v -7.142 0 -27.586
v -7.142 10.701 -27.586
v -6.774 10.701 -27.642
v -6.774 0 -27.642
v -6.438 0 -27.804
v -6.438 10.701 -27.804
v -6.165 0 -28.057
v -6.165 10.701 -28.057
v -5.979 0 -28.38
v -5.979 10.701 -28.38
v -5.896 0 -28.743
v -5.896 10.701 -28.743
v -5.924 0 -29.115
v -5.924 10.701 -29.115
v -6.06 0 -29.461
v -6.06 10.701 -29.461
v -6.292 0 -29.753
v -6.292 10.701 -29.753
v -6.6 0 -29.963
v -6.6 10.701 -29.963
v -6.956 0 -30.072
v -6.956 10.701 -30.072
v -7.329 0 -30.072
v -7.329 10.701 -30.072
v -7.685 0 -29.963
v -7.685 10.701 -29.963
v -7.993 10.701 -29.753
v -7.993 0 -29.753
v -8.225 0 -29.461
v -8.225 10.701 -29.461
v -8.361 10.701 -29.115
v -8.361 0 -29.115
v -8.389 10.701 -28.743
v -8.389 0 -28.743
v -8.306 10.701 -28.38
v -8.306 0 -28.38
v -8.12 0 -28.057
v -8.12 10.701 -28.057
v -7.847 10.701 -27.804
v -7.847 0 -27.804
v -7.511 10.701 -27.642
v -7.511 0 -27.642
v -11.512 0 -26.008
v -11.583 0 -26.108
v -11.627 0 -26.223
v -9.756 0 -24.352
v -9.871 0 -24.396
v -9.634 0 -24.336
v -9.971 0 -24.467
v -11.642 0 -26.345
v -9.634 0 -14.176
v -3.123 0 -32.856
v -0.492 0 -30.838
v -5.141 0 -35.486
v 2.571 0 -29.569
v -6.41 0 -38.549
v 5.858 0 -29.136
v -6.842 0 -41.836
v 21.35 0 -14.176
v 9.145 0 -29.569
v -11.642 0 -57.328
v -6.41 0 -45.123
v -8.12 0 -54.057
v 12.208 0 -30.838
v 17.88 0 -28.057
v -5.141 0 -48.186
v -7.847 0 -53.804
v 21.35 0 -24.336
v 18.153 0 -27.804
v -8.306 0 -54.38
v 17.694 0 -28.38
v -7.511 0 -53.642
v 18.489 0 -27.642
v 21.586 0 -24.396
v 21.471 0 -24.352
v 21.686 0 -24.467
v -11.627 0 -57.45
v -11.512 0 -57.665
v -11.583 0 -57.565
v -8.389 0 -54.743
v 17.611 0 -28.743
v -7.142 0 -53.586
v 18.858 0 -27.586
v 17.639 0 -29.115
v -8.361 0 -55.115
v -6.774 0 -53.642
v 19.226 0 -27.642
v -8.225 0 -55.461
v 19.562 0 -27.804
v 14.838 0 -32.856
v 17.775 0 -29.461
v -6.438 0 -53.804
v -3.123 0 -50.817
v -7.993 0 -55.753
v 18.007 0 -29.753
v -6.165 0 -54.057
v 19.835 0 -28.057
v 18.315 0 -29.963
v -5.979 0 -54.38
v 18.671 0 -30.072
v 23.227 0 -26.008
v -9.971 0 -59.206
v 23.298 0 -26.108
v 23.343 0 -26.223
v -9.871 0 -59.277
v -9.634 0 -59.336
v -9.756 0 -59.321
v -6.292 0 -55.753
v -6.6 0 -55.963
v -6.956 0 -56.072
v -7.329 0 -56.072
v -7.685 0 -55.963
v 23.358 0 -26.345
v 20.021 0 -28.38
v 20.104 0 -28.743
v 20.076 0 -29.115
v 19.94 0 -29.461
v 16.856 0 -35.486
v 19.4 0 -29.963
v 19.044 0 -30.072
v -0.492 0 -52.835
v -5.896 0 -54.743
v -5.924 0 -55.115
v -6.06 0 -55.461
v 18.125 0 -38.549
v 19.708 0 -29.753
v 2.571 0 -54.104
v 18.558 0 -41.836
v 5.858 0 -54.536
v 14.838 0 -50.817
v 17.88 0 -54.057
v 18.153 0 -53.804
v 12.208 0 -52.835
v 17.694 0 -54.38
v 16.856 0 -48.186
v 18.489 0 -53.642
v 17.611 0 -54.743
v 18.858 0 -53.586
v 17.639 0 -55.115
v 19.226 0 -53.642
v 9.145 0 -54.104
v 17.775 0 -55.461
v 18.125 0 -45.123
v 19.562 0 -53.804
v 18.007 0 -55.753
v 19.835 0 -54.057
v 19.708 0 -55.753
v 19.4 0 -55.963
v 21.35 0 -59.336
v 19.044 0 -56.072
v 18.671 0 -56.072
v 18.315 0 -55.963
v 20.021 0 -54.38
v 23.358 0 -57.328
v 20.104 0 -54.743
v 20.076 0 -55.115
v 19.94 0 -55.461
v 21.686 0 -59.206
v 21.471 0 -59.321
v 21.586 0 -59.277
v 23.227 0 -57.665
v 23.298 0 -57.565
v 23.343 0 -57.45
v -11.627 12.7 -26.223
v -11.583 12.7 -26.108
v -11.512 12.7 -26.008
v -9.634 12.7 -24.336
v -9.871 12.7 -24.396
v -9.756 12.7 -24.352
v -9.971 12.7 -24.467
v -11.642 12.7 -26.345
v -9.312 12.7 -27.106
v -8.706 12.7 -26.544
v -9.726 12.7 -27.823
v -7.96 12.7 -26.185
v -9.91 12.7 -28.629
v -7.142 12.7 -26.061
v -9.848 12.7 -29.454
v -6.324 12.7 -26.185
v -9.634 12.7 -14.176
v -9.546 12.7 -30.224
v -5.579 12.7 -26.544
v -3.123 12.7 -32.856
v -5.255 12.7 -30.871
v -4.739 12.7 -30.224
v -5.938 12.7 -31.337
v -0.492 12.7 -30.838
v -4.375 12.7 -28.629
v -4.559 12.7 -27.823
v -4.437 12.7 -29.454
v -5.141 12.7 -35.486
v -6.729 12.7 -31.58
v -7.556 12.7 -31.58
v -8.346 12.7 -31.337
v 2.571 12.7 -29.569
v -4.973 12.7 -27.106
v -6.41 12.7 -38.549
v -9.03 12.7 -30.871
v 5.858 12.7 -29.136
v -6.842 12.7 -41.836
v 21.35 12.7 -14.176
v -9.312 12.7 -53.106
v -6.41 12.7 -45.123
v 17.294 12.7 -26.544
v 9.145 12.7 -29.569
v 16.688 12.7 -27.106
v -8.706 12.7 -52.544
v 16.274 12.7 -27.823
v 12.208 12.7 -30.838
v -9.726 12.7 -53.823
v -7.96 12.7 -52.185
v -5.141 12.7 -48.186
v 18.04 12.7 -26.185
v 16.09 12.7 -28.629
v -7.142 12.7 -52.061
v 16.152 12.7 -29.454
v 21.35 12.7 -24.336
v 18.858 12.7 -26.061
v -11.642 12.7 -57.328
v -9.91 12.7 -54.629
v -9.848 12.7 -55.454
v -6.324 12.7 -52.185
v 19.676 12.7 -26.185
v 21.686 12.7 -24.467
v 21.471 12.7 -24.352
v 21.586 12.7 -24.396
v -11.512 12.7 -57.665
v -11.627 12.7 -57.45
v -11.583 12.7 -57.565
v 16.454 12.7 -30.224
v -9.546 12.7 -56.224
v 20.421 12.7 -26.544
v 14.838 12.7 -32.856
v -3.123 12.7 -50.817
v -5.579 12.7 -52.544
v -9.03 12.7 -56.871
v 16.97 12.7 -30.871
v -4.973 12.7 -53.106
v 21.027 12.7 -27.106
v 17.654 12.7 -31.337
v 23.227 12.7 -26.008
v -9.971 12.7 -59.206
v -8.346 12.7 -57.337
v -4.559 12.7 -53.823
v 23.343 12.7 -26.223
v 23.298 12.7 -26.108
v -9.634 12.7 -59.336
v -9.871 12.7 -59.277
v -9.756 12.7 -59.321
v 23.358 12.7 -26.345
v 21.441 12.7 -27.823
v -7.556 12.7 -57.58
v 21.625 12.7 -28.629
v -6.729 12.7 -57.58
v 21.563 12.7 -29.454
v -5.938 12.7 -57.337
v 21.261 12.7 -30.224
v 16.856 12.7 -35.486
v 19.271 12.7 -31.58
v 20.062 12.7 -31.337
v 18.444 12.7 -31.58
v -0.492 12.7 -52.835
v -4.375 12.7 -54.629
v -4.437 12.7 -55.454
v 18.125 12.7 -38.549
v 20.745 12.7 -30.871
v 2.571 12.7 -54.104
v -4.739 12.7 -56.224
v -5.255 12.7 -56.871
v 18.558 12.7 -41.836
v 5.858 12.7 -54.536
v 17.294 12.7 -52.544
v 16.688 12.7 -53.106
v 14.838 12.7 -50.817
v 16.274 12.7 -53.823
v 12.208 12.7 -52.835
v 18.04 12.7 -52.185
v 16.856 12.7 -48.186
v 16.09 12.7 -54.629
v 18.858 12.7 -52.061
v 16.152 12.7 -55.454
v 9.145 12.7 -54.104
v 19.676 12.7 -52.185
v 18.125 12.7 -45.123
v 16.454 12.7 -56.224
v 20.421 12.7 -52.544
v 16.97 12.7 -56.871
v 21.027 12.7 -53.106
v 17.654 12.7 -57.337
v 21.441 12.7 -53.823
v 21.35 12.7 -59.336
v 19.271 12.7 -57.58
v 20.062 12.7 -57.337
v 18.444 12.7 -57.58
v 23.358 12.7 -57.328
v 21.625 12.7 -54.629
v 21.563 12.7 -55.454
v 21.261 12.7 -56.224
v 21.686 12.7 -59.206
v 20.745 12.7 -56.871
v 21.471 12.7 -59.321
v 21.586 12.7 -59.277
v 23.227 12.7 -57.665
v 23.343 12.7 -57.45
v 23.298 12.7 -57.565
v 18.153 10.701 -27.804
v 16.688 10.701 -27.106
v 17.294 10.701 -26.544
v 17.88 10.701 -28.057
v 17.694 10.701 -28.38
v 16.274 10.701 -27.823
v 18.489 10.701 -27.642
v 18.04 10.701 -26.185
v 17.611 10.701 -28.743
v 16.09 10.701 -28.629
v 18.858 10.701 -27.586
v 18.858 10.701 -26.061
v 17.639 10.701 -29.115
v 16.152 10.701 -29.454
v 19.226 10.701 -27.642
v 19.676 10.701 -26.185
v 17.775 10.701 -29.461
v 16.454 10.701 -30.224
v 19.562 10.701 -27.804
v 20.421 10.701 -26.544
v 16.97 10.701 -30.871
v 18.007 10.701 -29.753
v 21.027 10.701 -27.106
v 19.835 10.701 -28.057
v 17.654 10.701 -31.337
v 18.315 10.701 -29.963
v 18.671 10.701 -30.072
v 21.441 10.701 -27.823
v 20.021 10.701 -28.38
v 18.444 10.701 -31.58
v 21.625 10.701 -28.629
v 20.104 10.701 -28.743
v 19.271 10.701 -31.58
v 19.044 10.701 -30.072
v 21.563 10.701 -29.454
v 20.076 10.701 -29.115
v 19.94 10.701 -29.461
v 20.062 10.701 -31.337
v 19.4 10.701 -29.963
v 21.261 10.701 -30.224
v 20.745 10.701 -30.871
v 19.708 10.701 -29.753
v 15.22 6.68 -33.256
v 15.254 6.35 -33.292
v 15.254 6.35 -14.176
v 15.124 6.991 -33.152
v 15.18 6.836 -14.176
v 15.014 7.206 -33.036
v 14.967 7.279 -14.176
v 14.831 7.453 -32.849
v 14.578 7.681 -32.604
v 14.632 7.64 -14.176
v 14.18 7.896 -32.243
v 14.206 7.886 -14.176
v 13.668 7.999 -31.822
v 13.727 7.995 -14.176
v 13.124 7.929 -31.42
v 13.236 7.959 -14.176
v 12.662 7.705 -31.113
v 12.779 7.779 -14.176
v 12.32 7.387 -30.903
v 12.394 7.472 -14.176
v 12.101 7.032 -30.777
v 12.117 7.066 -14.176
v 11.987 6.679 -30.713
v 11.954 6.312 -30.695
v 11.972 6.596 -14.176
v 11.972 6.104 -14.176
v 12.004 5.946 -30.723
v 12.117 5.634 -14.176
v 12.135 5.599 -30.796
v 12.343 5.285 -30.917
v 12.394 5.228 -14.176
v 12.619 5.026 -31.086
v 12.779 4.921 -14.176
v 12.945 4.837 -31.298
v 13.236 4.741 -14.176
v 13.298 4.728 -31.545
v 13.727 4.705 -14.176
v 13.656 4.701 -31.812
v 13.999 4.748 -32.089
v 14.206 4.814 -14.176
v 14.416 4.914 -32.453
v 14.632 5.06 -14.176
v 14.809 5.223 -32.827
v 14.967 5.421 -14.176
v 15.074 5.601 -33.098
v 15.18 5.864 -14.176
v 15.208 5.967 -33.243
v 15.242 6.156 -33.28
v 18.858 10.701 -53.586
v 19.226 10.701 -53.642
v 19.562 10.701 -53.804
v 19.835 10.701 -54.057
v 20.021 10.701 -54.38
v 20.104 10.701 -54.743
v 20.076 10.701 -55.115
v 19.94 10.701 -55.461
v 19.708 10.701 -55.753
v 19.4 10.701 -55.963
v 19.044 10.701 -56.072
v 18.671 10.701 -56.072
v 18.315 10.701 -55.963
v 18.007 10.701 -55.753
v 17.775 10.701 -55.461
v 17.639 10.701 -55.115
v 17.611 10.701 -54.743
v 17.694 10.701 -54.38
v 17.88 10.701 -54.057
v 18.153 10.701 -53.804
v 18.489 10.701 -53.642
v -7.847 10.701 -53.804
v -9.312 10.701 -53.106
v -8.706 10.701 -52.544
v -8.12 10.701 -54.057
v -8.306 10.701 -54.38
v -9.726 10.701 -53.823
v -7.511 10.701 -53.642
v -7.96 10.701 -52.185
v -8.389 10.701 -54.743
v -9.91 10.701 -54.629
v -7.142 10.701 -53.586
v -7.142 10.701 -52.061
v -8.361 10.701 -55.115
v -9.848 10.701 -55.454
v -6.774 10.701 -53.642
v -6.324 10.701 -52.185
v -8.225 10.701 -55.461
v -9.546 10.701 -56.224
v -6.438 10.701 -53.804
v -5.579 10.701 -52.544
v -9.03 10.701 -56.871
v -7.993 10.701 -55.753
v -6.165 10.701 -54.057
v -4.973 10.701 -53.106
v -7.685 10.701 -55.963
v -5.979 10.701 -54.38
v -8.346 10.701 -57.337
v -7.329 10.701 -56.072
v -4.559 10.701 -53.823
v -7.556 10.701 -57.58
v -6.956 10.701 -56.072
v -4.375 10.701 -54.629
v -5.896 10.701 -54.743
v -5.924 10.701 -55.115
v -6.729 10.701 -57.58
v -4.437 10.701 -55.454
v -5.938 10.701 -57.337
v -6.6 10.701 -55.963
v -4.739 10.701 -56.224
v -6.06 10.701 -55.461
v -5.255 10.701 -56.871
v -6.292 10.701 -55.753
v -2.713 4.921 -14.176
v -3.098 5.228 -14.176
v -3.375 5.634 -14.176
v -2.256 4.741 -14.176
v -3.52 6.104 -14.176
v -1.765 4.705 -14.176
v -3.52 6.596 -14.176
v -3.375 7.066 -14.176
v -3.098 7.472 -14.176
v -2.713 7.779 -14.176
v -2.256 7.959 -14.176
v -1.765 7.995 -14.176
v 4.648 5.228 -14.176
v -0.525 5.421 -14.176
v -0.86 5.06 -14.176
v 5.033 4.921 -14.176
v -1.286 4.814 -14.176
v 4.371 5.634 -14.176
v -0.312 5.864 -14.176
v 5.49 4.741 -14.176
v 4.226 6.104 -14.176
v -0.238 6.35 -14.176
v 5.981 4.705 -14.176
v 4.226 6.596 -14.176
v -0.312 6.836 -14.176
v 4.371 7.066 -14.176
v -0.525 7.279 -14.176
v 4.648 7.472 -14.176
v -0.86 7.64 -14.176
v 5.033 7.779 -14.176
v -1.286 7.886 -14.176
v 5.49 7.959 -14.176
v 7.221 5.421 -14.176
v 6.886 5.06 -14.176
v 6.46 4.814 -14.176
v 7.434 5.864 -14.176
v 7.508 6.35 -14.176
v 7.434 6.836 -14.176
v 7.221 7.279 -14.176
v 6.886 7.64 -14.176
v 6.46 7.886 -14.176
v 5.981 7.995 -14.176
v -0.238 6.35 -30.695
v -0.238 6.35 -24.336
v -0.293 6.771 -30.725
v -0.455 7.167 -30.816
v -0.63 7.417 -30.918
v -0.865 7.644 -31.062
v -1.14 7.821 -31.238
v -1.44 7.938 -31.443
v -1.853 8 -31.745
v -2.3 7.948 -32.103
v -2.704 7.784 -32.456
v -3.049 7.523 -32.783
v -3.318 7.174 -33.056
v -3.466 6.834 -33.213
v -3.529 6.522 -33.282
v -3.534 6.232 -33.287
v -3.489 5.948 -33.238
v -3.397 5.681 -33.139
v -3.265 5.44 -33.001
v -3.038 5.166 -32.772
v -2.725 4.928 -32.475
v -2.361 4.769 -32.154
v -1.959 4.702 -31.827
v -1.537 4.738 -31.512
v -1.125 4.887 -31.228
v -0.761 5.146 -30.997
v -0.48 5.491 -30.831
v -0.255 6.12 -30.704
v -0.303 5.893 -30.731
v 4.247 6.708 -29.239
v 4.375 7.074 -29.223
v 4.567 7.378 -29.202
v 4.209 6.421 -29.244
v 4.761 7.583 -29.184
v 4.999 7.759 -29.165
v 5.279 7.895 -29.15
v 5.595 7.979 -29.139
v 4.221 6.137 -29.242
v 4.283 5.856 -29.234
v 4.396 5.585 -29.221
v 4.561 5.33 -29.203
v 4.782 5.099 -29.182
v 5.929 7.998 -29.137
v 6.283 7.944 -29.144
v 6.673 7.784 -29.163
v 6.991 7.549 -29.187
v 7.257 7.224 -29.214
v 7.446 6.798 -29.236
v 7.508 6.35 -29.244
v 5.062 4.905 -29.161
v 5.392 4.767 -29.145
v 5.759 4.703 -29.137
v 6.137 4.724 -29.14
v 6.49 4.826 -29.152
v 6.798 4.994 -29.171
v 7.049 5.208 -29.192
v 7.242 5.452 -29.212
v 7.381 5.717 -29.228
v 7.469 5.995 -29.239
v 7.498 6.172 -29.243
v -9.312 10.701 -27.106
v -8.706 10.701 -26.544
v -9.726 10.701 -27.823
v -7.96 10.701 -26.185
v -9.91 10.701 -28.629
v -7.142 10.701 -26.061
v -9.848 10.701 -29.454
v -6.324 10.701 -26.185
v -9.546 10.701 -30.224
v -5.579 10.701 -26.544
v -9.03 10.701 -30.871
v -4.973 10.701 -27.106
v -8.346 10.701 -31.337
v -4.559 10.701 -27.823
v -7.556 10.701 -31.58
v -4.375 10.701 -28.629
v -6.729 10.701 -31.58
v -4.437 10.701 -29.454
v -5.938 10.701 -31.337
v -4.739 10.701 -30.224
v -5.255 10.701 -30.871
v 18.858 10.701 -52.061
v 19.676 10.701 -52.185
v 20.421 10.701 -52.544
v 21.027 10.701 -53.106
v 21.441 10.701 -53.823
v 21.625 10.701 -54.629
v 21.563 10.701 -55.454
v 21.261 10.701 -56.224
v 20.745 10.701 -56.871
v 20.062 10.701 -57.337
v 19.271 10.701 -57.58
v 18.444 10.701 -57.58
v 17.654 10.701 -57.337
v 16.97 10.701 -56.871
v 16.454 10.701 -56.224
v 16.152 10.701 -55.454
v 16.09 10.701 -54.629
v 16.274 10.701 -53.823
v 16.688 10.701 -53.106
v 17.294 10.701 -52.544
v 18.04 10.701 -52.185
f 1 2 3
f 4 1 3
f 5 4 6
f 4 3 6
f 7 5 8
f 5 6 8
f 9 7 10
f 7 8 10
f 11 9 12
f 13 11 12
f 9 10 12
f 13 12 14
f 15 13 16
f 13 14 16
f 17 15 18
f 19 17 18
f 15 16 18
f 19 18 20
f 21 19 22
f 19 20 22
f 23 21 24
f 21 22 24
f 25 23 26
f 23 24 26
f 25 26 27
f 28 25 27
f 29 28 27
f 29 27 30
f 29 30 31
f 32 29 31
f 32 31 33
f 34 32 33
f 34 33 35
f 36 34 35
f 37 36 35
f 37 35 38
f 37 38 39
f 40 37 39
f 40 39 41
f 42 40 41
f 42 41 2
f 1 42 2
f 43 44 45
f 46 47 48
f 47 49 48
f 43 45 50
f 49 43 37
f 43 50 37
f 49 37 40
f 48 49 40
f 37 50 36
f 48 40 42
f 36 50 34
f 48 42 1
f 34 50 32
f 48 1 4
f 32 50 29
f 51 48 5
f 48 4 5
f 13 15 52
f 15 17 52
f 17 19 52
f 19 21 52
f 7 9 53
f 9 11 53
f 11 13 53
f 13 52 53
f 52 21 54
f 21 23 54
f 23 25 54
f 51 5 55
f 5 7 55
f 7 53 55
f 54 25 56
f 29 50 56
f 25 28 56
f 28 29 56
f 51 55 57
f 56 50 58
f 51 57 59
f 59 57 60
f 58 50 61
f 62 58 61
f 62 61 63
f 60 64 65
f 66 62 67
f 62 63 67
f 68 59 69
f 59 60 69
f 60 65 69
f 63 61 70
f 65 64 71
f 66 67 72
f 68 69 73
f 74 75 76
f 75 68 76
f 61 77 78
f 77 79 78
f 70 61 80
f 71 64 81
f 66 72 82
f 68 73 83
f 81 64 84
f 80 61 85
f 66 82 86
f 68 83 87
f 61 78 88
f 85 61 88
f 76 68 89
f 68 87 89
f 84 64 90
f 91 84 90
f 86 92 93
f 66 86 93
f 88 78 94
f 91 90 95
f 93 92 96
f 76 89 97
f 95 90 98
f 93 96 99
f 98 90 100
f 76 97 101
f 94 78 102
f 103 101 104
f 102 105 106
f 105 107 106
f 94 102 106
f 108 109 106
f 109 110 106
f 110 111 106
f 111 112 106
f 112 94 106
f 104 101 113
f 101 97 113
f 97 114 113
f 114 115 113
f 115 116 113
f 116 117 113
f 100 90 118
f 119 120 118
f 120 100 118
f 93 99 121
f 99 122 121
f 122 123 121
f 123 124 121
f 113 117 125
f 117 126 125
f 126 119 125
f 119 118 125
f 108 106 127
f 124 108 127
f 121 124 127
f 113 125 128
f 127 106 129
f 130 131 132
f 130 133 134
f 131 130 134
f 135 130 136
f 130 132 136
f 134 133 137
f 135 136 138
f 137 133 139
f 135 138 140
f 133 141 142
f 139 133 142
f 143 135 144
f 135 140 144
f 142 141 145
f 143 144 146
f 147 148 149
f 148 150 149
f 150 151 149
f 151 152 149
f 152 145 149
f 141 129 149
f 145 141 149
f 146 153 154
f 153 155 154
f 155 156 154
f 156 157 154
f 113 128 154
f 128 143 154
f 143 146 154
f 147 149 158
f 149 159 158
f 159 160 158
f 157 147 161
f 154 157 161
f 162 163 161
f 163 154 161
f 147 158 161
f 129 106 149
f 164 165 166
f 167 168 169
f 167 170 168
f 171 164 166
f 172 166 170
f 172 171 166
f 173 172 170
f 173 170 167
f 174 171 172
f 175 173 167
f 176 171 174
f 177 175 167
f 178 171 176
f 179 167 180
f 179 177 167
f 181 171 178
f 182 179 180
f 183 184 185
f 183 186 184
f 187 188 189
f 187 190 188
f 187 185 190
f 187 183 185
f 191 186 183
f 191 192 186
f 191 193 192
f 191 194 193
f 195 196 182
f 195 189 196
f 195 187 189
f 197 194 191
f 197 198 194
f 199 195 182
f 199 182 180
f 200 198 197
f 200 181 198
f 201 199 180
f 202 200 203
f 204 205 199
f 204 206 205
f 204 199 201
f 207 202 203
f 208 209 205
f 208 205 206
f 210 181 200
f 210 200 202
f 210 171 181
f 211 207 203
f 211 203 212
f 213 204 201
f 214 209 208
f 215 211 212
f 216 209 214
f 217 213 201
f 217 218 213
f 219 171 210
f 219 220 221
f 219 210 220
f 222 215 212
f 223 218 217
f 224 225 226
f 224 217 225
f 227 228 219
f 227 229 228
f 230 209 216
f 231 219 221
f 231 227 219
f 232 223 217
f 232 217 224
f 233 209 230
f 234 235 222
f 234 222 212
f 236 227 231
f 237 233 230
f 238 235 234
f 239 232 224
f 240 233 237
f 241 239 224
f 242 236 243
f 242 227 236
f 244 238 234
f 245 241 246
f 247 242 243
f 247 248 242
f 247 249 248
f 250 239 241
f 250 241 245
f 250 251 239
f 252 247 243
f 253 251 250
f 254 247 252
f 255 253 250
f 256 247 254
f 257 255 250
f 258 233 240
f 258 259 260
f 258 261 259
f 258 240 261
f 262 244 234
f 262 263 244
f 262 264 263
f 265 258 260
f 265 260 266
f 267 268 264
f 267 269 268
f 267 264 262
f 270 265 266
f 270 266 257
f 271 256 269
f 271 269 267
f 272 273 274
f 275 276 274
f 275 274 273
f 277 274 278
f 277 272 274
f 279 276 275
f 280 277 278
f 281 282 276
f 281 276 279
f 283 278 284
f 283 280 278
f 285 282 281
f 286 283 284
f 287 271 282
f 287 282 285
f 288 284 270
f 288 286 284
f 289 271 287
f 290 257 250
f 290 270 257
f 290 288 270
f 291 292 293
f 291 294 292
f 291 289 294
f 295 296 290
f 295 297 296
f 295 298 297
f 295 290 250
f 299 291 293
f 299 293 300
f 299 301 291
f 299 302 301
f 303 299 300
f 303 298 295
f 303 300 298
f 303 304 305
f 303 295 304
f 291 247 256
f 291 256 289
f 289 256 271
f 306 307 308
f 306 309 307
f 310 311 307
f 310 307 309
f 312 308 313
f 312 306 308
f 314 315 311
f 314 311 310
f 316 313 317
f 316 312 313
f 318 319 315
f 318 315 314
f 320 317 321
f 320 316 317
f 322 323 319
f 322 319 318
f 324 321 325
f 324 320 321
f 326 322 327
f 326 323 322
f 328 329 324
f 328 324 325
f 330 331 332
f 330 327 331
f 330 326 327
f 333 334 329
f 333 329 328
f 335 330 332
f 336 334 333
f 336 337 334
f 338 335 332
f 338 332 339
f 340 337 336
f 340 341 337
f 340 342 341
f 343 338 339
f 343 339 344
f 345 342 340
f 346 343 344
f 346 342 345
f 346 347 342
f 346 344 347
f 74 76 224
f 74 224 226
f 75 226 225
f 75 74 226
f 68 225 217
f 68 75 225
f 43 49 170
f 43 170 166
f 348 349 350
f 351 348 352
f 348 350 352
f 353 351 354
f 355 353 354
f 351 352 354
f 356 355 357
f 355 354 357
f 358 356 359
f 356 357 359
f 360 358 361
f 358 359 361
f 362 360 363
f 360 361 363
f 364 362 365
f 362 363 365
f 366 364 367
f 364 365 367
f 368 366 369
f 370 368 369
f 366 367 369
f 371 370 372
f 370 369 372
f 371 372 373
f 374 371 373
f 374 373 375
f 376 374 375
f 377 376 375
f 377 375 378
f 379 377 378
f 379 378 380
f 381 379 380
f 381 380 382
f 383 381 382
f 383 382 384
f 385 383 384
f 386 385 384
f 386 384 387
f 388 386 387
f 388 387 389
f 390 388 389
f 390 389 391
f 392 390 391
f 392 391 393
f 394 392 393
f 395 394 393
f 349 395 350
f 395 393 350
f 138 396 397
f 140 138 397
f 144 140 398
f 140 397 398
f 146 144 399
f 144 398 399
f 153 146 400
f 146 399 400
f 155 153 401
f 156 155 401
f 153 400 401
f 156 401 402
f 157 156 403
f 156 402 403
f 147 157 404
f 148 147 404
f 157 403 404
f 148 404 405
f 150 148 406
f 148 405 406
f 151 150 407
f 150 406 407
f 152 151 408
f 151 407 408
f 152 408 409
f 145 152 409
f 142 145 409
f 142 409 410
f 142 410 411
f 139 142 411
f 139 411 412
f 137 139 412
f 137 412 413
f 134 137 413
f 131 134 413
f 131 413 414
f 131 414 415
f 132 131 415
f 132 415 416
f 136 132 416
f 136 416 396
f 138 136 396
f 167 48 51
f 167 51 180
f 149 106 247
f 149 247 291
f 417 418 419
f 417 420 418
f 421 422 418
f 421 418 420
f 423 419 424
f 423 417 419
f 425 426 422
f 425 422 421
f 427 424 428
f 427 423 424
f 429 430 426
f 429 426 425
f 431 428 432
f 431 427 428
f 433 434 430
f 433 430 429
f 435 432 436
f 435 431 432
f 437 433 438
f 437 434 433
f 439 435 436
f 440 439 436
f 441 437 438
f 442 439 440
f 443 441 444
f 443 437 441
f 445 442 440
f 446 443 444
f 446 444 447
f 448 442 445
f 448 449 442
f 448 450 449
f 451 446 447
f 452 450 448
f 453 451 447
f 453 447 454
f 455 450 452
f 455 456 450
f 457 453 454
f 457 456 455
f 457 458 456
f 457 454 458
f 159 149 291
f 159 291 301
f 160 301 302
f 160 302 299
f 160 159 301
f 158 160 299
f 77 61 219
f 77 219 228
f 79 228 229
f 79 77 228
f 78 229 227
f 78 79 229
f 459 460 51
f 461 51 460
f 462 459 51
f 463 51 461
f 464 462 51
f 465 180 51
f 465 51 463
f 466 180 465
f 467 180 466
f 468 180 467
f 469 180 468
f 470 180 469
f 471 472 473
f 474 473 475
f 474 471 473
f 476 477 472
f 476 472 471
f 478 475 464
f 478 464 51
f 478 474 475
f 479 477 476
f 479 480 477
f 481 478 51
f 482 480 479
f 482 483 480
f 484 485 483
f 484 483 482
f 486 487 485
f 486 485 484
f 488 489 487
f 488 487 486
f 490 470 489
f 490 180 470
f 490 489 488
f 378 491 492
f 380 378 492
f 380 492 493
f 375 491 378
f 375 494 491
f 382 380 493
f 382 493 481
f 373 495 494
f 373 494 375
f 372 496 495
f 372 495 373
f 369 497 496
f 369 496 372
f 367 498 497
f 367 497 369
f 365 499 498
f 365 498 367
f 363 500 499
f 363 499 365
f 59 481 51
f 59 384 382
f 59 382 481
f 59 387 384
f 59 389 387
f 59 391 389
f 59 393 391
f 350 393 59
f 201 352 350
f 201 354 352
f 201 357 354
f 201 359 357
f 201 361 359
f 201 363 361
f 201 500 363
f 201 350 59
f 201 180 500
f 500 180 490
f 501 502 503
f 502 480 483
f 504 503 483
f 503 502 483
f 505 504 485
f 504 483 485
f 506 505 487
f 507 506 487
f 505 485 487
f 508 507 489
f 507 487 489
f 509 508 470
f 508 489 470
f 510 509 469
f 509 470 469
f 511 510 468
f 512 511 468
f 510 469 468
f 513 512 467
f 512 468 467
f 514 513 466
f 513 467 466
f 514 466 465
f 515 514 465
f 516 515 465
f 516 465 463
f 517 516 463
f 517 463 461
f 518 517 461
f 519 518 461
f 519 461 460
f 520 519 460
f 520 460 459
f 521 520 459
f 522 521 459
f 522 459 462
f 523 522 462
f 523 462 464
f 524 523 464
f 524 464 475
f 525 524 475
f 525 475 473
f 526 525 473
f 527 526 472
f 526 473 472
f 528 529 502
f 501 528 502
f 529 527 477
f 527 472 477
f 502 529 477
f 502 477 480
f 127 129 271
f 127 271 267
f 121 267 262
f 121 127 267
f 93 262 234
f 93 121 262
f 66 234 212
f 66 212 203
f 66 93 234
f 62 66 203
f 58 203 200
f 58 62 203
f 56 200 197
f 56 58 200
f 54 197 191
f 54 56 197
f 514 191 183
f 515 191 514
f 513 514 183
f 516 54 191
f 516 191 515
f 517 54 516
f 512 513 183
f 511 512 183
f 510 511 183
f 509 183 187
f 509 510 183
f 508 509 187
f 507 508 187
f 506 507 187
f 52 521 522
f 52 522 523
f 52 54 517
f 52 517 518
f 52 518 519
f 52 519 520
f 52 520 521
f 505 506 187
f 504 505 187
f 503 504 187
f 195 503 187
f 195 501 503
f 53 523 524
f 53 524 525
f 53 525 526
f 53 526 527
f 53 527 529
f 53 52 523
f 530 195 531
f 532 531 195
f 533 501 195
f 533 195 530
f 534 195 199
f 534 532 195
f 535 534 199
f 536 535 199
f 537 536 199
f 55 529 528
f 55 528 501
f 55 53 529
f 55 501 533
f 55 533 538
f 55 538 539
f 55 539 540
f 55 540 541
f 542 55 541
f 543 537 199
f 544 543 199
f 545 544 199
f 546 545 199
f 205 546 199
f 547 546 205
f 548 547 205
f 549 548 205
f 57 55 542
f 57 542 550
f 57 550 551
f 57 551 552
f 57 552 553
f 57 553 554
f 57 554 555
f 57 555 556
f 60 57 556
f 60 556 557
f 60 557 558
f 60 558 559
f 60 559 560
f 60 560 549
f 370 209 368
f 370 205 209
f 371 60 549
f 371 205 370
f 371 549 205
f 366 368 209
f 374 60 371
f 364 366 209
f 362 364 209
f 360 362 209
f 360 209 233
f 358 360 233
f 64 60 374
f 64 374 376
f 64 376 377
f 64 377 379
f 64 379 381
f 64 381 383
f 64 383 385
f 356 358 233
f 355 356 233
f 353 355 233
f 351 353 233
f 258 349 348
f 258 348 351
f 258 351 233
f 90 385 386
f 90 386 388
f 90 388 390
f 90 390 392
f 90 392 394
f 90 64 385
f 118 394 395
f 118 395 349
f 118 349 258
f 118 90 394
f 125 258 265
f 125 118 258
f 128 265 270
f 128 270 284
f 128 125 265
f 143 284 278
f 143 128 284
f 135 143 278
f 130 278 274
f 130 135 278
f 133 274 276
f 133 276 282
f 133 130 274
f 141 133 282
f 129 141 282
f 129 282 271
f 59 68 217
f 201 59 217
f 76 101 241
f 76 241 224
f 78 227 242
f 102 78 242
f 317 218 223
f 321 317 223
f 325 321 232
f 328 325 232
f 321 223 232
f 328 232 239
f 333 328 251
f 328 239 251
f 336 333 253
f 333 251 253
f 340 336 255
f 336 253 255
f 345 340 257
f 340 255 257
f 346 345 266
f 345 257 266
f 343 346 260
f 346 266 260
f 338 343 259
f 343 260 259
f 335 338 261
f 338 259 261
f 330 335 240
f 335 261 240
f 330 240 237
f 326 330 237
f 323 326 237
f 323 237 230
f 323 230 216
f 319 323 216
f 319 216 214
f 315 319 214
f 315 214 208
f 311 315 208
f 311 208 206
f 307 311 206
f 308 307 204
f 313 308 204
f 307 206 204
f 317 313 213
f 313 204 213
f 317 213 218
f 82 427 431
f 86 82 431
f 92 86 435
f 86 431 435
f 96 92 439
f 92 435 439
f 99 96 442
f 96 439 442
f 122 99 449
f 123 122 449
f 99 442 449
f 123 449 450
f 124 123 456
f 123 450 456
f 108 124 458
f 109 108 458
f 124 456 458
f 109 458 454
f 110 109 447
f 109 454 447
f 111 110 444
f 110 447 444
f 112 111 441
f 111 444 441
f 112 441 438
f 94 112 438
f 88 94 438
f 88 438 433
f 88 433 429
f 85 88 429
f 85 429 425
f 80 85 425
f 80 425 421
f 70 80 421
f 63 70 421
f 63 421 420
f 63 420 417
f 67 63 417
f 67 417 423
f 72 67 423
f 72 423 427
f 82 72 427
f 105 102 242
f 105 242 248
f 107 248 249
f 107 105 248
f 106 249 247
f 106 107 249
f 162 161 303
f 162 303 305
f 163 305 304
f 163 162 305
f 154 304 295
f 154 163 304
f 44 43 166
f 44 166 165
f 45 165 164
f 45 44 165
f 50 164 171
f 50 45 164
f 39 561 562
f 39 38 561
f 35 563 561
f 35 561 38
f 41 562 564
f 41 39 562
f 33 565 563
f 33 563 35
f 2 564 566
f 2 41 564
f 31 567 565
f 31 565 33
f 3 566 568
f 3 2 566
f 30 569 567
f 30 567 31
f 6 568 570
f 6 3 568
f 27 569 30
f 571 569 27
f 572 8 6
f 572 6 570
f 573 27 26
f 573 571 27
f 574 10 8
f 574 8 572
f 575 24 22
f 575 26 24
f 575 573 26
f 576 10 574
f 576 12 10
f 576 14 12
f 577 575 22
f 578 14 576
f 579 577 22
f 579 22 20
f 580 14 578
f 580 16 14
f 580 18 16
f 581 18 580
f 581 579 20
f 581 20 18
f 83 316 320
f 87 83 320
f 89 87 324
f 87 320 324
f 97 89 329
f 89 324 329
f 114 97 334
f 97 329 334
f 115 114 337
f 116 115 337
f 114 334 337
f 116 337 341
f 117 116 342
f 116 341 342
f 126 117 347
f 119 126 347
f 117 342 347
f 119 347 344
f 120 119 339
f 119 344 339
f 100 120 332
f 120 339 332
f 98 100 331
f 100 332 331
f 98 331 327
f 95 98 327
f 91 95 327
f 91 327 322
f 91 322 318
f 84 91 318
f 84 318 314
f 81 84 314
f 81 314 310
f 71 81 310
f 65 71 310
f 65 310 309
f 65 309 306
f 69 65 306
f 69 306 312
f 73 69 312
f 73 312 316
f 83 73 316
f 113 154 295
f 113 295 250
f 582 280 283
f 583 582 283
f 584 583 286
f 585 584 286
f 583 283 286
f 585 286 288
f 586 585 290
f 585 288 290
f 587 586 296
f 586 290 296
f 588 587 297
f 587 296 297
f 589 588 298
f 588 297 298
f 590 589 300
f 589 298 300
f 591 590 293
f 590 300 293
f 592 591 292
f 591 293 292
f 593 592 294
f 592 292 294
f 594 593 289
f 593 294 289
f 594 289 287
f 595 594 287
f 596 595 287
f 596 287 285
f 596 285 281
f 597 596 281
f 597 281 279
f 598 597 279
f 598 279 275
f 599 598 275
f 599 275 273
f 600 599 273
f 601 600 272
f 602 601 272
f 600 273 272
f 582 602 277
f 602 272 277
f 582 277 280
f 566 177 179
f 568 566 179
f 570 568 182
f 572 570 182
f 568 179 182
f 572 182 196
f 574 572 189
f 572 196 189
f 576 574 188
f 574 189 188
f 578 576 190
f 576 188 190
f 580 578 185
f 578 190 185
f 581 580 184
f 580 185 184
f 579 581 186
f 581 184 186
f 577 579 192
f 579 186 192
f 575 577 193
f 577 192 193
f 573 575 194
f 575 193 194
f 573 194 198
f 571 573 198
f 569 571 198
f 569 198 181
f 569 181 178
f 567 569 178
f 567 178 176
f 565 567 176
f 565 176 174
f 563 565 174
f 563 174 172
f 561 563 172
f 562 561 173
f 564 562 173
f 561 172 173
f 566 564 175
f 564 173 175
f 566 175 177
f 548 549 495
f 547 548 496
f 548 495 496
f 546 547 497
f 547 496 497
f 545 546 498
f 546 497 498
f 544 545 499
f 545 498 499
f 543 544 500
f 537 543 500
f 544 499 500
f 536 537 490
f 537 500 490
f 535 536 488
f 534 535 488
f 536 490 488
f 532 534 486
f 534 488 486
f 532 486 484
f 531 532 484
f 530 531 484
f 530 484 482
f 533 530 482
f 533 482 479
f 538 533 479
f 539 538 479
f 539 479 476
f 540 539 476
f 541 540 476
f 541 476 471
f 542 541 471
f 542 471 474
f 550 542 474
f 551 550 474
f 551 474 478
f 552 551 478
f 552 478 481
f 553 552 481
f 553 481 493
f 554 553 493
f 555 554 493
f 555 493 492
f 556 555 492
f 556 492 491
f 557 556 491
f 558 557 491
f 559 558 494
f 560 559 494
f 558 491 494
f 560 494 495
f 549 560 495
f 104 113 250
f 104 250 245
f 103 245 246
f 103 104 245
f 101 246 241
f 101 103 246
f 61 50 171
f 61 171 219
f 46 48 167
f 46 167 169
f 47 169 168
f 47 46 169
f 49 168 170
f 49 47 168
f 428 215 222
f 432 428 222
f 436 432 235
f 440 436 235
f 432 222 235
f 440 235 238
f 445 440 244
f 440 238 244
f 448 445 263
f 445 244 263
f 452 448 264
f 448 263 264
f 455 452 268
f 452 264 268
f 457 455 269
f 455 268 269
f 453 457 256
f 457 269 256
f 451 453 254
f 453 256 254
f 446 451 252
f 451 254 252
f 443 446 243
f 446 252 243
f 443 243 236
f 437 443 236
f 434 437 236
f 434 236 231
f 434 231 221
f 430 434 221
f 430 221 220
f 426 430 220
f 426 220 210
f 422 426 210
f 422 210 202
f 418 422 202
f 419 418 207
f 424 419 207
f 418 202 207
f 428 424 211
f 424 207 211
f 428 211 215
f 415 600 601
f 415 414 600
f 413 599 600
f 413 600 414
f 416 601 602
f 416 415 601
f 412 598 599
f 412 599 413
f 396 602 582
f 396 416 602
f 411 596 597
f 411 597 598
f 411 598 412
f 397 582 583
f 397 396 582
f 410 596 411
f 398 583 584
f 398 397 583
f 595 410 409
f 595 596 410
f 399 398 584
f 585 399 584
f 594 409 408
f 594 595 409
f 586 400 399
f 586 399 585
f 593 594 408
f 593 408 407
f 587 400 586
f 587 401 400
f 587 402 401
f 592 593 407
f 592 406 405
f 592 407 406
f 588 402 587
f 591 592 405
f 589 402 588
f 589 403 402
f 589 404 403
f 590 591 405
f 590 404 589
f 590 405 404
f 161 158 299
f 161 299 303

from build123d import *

# Parameters (mm, degrees)
SKETCH1_R           = 12.7
SKETCH1_R_2         = 1.65
BOSS_EXTRUDE1_DEPTH = 12.7
SKETCH2_R           = 1.65
CUT_EXTRUDE1_DEPTH  = 12.7
SKETCH3_R           = 2.77495
CUT_EXTRUDE3_DEPTH  = 1.99898
SKETCH7_R           = 1.65
BOSS_EXTRUDE2_DEPTH = 10.70102
SKETCH8_R           = 1.65
BOSS_EXTRUDE3_DEPTH = 10.70102
SKETCH9_R           = 1.65
BOSS_EXTRUDE4_DEPTH = 10.70102
SKETCH10_R          = 1.65
BOSS_EXTRUDE5_DEPTH = 10.70102
SKETCH12_R          = 1.25
CUT_EXTRUDE4_DEPTH  = 12.7
SKETCH11_R          = 1.25
CUT_EXTRUDE5_DEPTH  = 12.7
SKETCH17_W          = 30.98386677
SKETCH17_H          = 12.7
BOSS_EXTRUDE6_DEPTH = 10.16
SKETCH18_R          = 1.650000002
SKETCH18_R_2        = 1.65
CUT_EXTRUDE6_DEPTH  = 24.384


with BuildPart() as part:
    # Sketch1 → Boss-Extrude1 (new body)
    with BuildSketch(Plane(origin=(0, 0, 0), x_dir=(1, 0, 0), z_dir=(0, 1, 0))):
        with BuildLine():
            Line((21.686311219, 59.206008809), (23.227161891, 57.665158137))
            ThreePointArc((23.227161891, 57.665158137), (23.323849078, 57.508955756), (23.357596674, 57.328376976))
            Line((23.357596674, 57.328376976), (23.357596674, 26.344510207))
            ThreePointArc((23.357596674, 26.344510207), (23.323849078, 26.163931427), (23.227161891, 26.007729046))
            Line((23.227161891, 26.007729046), (21.686311219, 24.466878374))
            ThreePointArc((21.686311219, 24.466878374), (21.530108838, 24.370191187), (21.349530059, 24.336443591))
            Line((21.349530059, 24.336443591), (-9.634336711, 24.336443591))
            ThreePointArc((-9.634336711, 24.336443591), (-9.814915491, 24.370191187), (-9.971117871, 24.466878374))
            Line((-9.971117871, 24.466878374), (-11.511968543, 26.007729046))
            ThreePointArc((-11.511968543, 26.007729046), (-11.60865573, 26.163931427), (-11.642403326, 26.344510207))
            Line((-11.642403326, 26.344510207), (-11.642403326, 57.328376976))
            ThreePointArc((-11.642403326, 57.328376976), (-11.60865573, 57.508955756), (-11.511968543, 57.665158137))
            Line((-11.511968543, 57.665158137), (-9.971117871, 59.206008809))
            ThreePointArc((-9.971117871, 59.206008809), (-9.814915491, 59.302695995), (-9.634336711, 59.336443591))
            Line((-9.634336711, 59.336443591), (21.349530059, 59.336443591))
            ThreePointArc((21.349530059, 59.336443591), (21.530108838, 59.302695995), (21.686311219, 59.206008809))
        make_face()
        with Locations(Location((5.857596674, 41.836443591, 0), (0, 0, 90))):
            Circle(SKETCH1_R, mode=Mode.SUBTRACT)
        with Locations(Location((18.857596674, 54.836443591, 0), (0, 0, 90))):
            Circle(SKETCH1_R_2, mode=Mode.SUBTRACT)
        with Locations(Location((18.857596674, 28.836443591, 0), (0, 0, 90))):
            Circle(SKETCH1_R_2, mode=Mode.SUBTRACT)
        with Locations(Location((-7.142403326, 54.836443591, 0), (0, 0, 90))):
            Circle(SKETCH1_R_2, mode=Mode.SUBTRACT)
        with Locations(Location((-7.142403326, 28.836443591, 0), (0, 0, 90))):
            Circle(SKETCH1_R_2, mode=Mode.SUBTRACT)
    extrude(amount=BOSS_EXTRUDE1_DEPTH)

    # Sketch2 → Cut-Extrude1 (cut)
    with BuildSketch(Plane.XY.offset(-24.336443591)):
        with Locations((-1.888370018, 6.35)):
            Circle(SKETCH2_R)
        with Locations((13.603563366, 6.35)):
            Circle(SKETCH2_R)
        with Locations((5.857596674, 6.35)):
            Circle(SKETCH2_R)
    extrude(amount=-CUT_EXTRUDE1_DEPTH, mode=Mode.SUBTRACT)

    # Sketch3 → Cut-Extrude3 (cut)
    with BuildSketch(Plane(origin=(0, 12.7, 0), x_dir=(1, 0, 0), z_dir=(0, 1, 0))):
        with Locations(Location((-7.142403326, 54.836443591, 0), (0, 0, 270))):
            Circle(SKETCH3_R)
        with Locations(Location((18.857596674, 54.836443591, 0), (0, 0, 270))):
            Circle(SKETCH3_R)
        with Locations(Location((-7.142403326, 28.836443591, 0), (0, 0, 270))):
            Circle(SKETCH3_R)
        with Locations(Location((18.857596674, 28.836443591, 0), (0, 0, 270))):
            Circle(SKETCH3_R)
    extrude(amount=-CUT_EXTRUDE3_DEPTH, mode=Mode.SUBTRACT)

    # Sketch7 → Boss-Extrude2 (add, through all)
    with BuildSketch(Plane(origin=(0, 10.70102, 0), x_dir=(1, 0, 0), z_dir=(0, 1, 0))):
        with Locations((-7.142403326, 28.836443591)):
            Circle(SKETCH7_R)
    extrude(amount=-BOSS_EXTRUDE2_DEPTH)

    # Sketch8 → Boss-Extrude3 (add, through all)
    with BuildSketch(Plane(origin=(0, 10.70102, 0), x_dir=(1, 0, 0), z_dir=(0, 1, 0))):
        with Locations((-7.142403326, 54.836443591)):
            Circle(SKETCH8_R)
    extrude(amount=-BOSS_EXTRUDE3_DEPTH)

    # Sketch9 → Boss-Extrude4 (add, through all)
    with BuildSketch(Plane(origin=(0, 10.70102, 0), x_dir=(1, 0, 0), z_dir=(0, 1, 0))):
        with Locations((18.857596674, 54.836443591)):
            Circle(SKETCH9_R)
    extrude(amount=-BOSS_EXTRUDE4_DEPTH)

    # Sketch10 → Boss-Extrude5 (add, through all)
    with BuildSketch(Plane(origin=(0, 10.70102, 0), x_dir=(1, 0, 0), z_dir=(0, 1, 0))):
        with Locations((18.857596674, 28.836443591)):
            Circle(SKETCH10_R)
    extrude(amount=-BOSS_EXTRUDE5_DEPTH)

    # Sketch12 → Cut-Extrude4 (cut)
    with BuildSketch(Plane(origin=(0, 10.70102, 0), x_dir=(1, 0, 0), z_dir=(0, 1, 0))):
        with Locations(Location((18.857596674, 54.836443591, 0), (0, 0, 270))):
            Circle(SKETCH12_R)
        with Locations(Location((-7.142403326, 28.836443591, 0), (0, 0, 270))):
            Circle(SKETCH12_R)
        with Locations(Location((18.857596674, 28.836443591, 0), (0, 0, 270))):
            Circle(SKETCH12_R)
    extrude(amount=-CUT_EXTRUDE4_DEPTH, mode=Mode.SUBTRACT)

    # Sketch11 → Cut-Extrude5 (cut)
    with BuildSketch(Plane(origin=(0, 10.70102, 0), x_dir=(1, 0, 0), z_dir=(0, 1, 0))):
        with Locations(Location((-7.142403326, 54.836443591, 0), (0, 0, 270))):
            Circle(SKETCH11_R)
    extrude(amount=-CUT_EXTRUDE5_DEPTH, mode=Mode.SUBTRACT)

    # Sketch17 → Boss-Extrude6 (add)
    with BuildSketch(Plane.XY.offset(-24.336443591)):
        with Locations((5.857596674, 6.35)):
            Rectangle(SKETCH17_W, SKETCH17_H)
    extrude(amount=BOSS_EXTRUDE6_DEPTH)

    # Sketch18 → Cut-Extrude6 (cut)
    with BuildSketch(Plane.XY.offset(-14.176443591)):
        with Locations((-1.888370018, 6.35)):
            Circle(SKETCH18_R)
        with Locations((5.857596674, 6.35)):
            Circle(SKETCH18_R_2)
        with Locations((13.603563366, 6.35)):
            Circle(SKETCH18_R_2)
    extrude(amount=-CUT_EXTRUDE6_DEPTH, mode=Mode.SUBTRACT)


solid = part.part
